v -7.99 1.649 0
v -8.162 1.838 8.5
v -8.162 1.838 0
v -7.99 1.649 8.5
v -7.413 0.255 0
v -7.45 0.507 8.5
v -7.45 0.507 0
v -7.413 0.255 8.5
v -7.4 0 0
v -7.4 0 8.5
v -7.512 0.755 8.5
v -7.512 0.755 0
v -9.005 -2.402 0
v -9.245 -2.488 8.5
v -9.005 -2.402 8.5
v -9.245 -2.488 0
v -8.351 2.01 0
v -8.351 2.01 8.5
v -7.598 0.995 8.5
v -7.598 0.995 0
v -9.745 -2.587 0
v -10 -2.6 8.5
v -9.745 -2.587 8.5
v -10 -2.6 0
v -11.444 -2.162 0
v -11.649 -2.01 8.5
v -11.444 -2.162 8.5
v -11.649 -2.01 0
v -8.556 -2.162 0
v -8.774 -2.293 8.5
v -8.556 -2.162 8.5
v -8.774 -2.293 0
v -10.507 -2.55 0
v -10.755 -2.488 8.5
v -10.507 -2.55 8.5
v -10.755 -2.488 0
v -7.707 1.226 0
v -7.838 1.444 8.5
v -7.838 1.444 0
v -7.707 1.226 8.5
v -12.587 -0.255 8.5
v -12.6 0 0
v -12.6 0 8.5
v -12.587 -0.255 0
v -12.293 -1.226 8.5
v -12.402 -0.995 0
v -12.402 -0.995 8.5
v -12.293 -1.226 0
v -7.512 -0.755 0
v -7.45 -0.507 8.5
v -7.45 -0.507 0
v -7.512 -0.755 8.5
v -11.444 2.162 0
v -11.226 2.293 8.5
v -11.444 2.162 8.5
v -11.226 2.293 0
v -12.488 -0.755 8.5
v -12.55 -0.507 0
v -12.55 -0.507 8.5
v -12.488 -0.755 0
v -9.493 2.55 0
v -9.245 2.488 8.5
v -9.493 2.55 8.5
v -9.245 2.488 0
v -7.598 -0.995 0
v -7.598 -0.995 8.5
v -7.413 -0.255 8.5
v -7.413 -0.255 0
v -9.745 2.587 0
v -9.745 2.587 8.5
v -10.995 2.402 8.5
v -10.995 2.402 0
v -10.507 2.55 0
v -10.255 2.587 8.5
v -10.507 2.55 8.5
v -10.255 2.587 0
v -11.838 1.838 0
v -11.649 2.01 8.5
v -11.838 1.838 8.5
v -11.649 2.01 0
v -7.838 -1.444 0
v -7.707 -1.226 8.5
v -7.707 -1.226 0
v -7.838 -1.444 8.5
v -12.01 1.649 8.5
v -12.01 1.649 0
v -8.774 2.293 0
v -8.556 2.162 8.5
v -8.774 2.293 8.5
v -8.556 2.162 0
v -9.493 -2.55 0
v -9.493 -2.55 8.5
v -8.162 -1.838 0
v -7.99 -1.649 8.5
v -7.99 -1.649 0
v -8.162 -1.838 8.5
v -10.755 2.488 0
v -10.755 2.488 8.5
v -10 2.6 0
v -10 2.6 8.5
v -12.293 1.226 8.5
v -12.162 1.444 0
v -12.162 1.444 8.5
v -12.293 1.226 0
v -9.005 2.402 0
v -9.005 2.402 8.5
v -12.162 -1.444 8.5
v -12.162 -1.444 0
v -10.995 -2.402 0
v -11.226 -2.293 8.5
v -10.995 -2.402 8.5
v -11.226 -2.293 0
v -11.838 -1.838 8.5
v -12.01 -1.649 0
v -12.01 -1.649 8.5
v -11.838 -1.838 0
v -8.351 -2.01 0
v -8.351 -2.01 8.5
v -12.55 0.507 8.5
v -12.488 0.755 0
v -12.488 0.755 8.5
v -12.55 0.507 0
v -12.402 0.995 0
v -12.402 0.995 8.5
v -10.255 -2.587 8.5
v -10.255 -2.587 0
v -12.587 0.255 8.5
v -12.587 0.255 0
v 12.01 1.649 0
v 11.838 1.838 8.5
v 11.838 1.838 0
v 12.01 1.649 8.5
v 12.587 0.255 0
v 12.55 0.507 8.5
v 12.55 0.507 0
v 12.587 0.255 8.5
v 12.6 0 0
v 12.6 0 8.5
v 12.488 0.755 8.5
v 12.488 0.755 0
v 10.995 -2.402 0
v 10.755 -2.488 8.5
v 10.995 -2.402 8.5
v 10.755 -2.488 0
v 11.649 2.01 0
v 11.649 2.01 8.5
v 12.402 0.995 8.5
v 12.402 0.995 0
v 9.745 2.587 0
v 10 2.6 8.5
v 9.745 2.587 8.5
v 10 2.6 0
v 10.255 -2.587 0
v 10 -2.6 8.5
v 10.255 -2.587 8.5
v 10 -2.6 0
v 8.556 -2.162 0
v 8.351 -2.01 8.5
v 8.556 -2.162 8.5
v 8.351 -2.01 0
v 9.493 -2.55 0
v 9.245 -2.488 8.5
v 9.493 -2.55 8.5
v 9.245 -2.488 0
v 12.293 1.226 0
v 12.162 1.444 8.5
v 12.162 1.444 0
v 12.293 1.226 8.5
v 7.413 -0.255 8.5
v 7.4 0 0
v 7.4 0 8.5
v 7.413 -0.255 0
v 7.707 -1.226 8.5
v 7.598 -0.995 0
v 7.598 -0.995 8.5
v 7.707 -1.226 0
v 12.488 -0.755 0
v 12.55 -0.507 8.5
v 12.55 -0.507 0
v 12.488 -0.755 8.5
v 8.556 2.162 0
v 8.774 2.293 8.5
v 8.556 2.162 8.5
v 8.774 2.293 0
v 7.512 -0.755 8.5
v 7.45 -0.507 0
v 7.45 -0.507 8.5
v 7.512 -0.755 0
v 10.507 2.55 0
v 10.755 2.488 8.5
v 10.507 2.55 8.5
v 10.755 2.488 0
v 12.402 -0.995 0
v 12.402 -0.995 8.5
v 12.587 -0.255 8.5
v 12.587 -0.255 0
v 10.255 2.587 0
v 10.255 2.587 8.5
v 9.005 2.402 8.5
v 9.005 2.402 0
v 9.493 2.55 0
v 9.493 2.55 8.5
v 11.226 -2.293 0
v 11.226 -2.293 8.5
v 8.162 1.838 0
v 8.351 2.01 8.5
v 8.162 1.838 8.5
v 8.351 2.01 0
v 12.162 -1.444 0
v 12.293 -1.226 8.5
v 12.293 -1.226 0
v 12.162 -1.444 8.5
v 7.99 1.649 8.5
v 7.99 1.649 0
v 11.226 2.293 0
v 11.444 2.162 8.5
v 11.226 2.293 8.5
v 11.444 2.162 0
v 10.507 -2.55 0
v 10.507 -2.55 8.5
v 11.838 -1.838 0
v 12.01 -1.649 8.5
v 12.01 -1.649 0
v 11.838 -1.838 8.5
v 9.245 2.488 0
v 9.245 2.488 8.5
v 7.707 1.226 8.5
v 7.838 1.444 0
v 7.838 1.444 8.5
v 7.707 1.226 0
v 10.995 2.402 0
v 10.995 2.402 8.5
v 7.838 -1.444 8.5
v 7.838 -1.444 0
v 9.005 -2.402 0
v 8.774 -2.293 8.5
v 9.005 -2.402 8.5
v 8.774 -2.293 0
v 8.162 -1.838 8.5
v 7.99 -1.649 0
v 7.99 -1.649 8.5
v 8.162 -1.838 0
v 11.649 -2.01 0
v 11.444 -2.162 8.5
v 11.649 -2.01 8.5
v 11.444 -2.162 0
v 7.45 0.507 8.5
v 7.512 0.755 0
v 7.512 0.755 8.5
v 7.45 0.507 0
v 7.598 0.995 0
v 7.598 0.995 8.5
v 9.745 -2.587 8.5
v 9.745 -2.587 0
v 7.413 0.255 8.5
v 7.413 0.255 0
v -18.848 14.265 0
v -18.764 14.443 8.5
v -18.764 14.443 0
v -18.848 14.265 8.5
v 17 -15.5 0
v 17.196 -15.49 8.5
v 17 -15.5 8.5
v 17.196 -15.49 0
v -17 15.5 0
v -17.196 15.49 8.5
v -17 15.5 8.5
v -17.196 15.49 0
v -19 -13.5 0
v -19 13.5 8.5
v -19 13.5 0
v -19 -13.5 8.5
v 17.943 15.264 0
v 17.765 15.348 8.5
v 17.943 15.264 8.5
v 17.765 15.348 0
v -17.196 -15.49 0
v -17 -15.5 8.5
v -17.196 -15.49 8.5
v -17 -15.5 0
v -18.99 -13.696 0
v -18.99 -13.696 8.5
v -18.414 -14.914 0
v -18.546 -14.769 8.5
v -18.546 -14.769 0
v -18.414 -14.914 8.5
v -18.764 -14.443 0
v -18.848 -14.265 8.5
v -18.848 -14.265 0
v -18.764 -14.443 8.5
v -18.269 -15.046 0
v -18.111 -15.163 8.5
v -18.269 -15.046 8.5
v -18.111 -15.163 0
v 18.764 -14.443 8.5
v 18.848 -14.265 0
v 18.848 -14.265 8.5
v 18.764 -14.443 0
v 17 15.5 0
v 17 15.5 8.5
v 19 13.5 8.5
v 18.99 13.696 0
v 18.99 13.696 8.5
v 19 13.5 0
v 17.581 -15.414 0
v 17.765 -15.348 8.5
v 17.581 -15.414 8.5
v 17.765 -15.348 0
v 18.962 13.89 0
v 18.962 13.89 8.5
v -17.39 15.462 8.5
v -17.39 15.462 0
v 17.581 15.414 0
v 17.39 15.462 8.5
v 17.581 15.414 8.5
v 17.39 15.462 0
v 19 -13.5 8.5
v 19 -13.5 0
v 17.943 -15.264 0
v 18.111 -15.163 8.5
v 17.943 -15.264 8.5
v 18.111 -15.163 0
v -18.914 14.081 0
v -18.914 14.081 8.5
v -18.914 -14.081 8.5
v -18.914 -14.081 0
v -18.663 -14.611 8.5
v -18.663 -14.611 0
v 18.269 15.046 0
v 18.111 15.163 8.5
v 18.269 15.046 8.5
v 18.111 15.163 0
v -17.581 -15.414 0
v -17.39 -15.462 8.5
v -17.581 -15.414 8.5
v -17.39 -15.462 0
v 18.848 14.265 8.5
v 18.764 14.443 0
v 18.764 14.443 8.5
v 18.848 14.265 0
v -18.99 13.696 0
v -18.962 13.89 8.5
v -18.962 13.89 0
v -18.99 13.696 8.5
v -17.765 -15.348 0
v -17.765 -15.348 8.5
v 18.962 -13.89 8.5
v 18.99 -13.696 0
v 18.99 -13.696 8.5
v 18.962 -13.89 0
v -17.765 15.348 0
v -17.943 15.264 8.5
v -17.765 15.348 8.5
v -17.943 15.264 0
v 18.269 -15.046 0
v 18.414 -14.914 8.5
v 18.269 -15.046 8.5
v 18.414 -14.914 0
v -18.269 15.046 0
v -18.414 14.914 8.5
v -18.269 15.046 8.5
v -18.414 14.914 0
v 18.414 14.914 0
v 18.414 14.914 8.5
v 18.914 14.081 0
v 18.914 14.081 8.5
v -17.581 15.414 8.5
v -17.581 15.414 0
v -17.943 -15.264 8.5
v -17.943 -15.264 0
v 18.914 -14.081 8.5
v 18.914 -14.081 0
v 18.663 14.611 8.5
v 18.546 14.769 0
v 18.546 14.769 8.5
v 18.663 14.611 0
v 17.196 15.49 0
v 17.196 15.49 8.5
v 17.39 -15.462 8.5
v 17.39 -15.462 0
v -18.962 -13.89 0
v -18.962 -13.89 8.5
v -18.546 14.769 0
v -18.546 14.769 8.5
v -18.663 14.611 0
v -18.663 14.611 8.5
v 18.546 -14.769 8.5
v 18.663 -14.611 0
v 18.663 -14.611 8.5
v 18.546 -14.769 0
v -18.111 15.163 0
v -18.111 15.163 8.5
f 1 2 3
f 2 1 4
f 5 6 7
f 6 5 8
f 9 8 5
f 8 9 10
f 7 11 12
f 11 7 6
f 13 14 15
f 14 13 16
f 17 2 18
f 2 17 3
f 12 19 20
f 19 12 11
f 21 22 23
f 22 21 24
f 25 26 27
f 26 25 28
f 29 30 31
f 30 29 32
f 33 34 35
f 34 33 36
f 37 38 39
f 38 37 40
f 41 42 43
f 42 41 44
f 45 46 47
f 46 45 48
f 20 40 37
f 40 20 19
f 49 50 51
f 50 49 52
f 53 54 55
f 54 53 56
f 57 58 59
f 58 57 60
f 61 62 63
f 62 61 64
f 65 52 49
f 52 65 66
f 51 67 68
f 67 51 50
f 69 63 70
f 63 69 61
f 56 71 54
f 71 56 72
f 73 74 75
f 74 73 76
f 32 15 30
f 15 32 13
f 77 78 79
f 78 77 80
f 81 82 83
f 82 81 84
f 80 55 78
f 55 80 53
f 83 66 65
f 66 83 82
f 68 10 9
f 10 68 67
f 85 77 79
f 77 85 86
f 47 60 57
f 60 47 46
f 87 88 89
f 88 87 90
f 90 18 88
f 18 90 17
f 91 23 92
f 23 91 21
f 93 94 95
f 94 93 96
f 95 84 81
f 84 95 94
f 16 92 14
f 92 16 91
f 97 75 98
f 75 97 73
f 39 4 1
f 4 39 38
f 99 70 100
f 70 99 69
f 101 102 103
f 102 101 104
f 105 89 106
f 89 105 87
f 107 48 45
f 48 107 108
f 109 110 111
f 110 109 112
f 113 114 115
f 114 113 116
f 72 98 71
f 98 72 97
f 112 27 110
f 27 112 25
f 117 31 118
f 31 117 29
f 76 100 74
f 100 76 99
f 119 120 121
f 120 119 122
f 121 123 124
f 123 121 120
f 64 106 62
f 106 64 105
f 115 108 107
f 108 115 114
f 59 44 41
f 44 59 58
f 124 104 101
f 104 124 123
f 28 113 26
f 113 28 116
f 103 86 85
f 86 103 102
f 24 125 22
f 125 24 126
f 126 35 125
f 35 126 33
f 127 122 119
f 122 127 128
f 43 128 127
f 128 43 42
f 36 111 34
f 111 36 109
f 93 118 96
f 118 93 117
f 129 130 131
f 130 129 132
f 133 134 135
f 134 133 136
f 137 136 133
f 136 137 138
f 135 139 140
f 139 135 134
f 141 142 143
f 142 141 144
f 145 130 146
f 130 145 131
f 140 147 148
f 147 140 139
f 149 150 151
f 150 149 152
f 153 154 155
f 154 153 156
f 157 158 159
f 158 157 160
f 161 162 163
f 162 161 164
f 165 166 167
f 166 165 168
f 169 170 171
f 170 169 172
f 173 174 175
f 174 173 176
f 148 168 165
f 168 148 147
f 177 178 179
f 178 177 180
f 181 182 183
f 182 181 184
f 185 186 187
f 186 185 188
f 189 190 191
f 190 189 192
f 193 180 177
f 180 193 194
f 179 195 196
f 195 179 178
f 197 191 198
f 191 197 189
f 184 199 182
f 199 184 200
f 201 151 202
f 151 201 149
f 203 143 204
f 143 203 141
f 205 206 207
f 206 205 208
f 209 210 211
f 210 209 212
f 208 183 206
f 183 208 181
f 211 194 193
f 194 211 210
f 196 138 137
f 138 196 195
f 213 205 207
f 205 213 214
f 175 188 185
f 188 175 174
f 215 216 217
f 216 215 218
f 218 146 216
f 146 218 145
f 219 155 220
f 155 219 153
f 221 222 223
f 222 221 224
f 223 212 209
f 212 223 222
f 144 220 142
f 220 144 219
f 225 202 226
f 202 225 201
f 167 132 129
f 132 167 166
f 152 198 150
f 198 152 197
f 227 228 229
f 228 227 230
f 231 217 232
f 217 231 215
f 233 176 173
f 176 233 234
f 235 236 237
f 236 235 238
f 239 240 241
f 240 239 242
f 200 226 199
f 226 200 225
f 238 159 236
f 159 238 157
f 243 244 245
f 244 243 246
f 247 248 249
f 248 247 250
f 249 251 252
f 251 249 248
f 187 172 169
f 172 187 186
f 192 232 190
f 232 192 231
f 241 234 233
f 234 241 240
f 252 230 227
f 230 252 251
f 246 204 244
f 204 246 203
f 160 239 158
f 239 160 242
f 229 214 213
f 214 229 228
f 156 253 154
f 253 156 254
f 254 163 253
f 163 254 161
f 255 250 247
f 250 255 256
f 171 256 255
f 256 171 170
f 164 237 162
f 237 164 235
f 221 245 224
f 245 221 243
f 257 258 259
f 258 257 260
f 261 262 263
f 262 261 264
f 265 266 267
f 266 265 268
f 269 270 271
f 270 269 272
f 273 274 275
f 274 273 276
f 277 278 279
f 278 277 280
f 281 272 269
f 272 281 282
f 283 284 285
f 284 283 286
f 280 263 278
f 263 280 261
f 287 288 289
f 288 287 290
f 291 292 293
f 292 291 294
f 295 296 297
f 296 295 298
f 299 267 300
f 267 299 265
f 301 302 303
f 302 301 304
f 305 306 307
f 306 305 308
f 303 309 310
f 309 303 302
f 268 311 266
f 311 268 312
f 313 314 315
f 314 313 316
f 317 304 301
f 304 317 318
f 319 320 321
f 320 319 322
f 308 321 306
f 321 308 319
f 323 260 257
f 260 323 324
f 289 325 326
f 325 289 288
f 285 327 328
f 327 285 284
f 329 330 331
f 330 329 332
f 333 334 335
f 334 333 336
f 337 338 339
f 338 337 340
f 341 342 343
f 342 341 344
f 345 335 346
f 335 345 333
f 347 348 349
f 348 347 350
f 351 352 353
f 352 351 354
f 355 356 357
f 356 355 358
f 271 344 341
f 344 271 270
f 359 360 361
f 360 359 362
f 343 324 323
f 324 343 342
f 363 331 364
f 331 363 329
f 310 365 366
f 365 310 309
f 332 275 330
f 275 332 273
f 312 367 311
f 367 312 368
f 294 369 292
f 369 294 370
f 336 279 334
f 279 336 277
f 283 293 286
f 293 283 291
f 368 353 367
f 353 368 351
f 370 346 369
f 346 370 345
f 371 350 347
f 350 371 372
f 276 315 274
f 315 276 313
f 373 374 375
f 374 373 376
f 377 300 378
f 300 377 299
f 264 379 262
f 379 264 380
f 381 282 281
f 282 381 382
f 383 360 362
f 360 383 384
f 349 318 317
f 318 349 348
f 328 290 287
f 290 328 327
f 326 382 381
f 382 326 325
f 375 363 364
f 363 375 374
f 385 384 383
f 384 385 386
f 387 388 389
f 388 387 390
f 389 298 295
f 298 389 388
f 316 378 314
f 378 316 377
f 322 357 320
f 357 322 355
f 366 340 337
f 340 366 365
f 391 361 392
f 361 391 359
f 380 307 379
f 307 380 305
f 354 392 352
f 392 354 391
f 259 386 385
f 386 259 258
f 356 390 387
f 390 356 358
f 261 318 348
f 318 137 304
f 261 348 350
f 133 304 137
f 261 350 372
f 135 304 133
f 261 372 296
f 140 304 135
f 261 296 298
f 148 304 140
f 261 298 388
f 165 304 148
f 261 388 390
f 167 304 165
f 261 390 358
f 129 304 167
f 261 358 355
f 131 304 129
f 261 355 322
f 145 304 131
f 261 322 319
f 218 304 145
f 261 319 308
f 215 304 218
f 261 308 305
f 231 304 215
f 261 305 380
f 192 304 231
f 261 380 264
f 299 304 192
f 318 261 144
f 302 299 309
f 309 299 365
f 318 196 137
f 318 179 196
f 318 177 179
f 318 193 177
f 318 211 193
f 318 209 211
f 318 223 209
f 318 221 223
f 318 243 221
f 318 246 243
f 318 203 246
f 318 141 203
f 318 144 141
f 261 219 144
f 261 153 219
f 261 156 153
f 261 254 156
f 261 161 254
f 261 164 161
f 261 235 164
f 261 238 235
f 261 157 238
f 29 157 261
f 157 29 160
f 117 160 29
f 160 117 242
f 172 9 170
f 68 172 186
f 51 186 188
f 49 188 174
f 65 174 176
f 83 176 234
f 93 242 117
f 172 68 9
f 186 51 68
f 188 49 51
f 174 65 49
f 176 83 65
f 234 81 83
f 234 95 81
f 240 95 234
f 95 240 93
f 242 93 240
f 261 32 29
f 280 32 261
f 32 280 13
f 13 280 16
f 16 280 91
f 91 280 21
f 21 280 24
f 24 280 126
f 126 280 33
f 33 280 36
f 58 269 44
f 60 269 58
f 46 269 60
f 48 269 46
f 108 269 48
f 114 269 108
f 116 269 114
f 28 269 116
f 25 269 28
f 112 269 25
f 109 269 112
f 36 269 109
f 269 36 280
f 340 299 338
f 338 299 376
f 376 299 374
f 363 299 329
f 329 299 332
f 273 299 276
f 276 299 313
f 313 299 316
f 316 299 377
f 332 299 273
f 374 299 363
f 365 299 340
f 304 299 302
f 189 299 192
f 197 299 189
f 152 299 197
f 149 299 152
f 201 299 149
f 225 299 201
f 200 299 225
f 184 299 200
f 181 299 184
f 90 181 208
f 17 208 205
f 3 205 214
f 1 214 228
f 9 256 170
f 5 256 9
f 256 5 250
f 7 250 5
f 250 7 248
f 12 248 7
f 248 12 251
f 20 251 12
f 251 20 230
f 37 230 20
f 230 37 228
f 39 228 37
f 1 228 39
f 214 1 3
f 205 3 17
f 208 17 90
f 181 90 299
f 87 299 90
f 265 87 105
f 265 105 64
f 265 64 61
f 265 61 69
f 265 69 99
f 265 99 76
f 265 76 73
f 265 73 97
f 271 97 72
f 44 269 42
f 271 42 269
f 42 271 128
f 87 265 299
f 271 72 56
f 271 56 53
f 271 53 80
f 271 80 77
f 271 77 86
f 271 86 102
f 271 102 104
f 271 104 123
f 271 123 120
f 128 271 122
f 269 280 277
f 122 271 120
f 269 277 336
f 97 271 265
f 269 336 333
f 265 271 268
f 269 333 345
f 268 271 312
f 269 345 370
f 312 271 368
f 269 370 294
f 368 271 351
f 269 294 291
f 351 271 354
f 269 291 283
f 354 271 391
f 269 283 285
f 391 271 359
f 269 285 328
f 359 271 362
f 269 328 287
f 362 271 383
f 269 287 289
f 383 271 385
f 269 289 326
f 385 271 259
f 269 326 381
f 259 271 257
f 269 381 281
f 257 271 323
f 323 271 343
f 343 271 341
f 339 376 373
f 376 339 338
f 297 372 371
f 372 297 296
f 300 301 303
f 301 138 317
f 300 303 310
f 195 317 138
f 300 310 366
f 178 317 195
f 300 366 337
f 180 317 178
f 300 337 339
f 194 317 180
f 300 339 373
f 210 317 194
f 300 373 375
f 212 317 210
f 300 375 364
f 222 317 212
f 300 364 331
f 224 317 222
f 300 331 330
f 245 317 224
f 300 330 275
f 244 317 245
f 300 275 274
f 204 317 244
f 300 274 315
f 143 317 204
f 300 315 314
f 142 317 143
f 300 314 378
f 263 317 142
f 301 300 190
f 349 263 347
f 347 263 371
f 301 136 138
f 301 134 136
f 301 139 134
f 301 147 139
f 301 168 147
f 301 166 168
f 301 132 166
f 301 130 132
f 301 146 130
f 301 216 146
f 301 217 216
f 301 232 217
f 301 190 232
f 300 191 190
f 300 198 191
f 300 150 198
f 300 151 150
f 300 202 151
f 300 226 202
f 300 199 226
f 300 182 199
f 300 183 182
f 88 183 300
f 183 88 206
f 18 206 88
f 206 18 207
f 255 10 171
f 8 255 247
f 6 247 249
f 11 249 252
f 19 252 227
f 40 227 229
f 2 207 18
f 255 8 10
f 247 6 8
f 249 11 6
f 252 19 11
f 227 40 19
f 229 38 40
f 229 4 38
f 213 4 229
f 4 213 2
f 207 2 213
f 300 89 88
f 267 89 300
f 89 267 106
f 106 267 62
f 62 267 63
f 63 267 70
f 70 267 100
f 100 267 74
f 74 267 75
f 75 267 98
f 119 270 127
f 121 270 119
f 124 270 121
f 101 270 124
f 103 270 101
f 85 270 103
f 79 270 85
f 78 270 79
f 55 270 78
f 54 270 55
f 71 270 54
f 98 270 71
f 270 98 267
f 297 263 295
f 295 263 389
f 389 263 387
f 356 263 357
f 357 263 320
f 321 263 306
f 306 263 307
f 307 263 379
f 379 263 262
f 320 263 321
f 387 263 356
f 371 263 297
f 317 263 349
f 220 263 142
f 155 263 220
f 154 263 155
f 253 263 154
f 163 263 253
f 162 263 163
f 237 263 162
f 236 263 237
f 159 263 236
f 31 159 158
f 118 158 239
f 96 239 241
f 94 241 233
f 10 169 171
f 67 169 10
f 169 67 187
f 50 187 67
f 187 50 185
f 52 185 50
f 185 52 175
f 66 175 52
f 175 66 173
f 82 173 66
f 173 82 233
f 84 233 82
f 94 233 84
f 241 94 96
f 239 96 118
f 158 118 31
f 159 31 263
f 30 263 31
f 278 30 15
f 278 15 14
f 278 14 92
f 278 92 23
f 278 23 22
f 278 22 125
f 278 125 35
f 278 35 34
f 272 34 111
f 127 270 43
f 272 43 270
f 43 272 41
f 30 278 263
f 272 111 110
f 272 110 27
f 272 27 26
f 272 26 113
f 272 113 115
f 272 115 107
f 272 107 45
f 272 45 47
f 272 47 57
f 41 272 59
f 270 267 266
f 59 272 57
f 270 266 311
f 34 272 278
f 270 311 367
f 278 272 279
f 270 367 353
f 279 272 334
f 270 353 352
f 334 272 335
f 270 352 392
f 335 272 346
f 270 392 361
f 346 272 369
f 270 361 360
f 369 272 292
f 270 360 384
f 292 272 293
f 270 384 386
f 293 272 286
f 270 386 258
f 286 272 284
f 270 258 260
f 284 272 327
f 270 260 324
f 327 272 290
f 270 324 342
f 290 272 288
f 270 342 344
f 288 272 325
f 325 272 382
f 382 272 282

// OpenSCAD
$fn = 64;

size = [38, 31, 8.5];   // [X, Y, Z] overall
corner_r = 2.0;

hole_d = 5.2;
hole_offset = 9.0;

module rounded_plate(sz=[38,31,8.5], r=2){
    x = sz[0]; y = sz[1]; z = sz[2];
    linear_extrude(height=z)
        offset(r=r)
            square([x-2*r, y-2*r], center=true);
}

difference() {
    rounded_plate(size, corner_r);

    // Two mounting holes along X axis
    for (sx = [-1, 1]) {
        translate([sx*(size[0]/2 - hole_offset), 0, -0.5])
            cylinder(h=size[2]+1, d=hole_d);
    }
}
